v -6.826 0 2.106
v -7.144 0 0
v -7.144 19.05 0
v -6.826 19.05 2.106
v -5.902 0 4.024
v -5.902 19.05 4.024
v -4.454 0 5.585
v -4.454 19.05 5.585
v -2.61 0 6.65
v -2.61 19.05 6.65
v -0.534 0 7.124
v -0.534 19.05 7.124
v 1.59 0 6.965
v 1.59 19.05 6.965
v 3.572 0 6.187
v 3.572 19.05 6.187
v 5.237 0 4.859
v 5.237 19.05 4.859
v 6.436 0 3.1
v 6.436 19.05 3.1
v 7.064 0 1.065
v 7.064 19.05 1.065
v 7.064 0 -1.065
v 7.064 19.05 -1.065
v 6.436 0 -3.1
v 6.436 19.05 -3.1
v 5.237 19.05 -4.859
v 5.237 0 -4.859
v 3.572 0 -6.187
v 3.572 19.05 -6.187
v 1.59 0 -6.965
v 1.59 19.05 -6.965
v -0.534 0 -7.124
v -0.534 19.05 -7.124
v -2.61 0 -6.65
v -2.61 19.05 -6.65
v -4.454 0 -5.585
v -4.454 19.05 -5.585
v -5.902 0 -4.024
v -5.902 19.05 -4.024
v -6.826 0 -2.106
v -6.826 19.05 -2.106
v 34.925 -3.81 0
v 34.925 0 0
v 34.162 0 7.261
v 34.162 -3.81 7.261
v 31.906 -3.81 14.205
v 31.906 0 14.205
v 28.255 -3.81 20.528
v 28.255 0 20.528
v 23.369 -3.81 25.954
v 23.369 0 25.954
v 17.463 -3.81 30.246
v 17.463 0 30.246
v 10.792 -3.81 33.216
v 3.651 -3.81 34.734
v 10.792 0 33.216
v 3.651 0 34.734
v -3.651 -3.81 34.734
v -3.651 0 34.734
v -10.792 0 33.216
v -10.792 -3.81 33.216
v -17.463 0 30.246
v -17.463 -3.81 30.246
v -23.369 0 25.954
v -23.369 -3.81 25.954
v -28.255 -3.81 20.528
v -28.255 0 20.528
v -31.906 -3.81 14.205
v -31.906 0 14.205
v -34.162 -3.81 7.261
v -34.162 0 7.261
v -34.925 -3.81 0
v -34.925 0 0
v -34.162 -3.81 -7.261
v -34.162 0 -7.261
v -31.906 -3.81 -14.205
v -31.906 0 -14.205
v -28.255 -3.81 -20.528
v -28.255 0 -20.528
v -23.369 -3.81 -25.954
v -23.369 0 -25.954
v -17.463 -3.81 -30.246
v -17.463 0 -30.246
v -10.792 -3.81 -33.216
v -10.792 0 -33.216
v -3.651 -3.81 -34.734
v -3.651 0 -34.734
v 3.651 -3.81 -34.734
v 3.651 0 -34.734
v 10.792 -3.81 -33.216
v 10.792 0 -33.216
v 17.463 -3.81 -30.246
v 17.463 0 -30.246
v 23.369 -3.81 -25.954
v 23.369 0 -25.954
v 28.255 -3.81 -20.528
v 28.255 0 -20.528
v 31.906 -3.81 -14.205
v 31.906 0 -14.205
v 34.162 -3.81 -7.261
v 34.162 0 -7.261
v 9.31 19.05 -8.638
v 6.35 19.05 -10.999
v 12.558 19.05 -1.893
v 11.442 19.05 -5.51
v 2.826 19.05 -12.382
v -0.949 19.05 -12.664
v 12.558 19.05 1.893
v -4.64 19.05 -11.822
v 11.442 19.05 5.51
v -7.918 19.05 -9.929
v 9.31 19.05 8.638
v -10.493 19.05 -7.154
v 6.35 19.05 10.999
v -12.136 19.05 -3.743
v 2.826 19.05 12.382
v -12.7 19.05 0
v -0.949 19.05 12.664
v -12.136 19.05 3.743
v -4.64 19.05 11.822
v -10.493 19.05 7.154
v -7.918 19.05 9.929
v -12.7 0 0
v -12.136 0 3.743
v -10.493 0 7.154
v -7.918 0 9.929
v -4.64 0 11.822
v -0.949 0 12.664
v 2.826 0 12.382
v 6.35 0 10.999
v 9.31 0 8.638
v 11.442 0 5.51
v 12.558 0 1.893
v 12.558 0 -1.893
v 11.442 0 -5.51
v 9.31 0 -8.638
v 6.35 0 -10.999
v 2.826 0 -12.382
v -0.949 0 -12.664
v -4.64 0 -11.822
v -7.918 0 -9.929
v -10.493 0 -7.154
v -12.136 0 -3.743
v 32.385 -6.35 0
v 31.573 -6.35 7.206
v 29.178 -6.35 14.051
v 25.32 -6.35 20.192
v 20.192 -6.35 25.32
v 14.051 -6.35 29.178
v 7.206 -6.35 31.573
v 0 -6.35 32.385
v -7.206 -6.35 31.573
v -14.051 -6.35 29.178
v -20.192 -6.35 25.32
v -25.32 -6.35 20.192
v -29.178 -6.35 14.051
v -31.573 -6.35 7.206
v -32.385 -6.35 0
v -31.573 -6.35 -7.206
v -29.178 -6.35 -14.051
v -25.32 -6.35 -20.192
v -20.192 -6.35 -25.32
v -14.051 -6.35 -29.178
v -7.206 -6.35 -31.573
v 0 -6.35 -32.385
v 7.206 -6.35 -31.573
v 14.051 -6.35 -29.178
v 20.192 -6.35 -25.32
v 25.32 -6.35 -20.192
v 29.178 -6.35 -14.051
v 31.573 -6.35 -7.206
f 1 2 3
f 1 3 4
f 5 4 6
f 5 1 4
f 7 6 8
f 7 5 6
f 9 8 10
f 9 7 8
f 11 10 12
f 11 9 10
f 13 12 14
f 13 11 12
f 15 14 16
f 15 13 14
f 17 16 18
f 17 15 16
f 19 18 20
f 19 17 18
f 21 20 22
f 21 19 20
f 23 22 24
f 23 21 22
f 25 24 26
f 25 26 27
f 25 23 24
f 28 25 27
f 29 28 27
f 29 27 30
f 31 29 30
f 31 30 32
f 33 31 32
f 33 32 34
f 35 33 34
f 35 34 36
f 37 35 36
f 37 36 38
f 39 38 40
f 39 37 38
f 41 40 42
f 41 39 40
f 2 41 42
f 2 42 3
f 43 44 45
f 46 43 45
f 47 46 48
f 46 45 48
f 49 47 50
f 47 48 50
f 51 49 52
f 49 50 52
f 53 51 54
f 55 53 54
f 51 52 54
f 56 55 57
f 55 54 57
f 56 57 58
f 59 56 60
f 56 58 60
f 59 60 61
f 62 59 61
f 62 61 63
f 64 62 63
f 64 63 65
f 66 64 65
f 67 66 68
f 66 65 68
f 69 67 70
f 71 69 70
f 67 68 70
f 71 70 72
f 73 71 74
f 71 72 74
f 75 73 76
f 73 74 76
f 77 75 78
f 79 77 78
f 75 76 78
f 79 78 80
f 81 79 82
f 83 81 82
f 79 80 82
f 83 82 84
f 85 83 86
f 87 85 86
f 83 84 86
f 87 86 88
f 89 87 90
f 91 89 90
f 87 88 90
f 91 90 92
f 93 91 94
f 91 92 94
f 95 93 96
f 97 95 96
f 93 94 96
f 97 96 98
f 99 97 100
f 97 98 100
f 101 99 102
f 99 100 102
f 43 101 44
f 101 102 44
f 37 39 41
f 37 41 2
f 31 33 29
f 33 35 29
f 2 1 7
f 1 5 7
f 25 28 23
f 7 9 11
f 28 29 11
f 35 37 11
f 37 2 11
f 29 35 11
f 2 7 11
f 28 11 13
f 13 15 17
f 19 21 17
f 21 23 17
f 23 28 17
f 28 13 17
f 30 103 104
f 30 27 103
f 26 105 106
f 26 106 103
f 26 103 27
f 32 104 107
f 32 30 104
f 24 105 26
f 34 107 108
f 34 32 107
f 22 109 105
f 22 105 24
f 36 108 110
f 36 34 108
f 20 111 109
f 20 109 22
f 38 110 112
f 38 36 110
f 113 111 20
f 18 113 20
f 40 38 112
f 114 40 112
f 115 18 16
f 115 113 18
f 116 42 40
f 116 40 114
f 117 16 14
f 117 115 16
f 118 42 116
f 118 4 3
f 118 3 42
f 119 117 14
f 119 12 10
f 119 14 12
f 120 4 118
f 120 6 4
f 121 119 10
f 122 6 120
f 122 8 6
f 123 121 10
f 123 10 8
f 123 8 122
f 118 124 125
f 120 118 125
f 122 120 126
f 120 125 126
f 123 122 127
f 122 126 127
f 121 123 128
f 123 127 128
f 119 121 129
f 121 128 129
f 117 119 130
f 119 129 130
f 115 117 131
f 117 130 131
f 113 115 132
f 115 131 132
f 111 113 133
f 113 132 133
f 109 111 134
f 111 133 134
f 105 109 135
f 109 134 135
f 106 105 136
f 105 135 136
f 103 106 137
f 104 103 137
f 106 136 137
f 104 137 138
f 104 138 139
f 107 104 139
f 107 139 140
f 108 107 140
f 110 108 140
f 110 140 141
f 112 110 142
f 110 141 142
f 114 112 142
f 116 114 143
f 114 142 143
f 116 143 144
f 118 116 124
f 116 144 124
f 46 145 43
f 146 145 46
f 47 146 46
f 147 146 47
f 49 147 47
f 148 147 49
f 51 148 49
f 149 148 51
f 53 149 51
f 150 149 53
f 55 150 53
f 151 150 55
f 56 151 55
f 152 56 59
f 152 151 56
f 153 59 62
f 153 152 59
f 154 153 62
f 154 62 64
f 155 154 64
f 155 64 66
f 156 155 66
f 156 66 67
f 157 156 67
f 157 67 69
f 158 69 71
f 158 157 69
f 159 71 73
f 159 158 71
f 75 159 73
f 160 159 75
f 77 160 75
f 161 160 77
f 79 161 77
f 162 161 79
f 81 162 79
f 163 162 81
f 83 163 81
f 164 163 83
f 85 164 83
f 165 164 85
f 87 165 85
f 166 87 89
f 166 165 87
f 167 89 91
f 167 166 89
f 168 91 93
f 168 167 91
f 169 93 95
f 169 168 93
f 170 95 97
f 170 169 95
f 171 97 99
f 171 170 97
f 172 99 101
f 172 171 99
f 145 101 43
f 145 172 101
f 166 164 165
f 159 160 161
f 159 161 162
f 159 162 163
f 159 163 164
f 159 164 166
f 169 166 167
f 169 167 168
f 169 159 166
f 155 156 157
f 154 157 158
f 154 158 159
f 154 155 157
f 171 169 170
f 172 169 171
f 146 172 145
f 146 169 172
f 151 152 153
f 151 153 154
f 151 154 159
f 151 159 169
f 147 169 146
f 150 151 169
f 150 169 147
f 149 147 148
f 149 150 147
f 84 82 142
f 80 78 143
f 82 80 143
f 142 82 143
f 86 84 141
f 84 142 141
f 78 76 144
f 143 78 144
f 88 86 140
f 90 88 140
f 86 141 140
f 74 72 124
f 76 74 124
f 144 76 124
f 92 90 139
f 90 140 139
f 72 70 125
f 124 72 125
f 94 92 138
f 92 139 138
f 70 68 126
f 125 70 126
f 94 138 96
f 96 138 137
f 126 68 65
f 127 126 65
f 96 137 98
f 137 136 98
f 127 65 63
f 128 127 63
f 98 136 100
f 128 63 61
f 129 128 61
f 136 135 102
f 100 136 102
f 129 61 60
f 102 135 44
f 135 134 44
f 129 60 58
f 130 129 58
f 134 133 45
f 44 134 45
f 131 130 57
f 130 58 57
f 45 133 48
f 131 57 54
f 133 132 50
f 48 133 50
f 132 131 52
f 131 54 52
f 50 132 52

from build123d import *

# Parameters (mm, degrees)
F0_R     = 34.925
F1_DEPTH = 6.35
F2_SIZE  = 2.54
F3_R     = 12.7
F3_R_2   = 7.14375
F4_DEPTH = 19.05


with BuildPart() as f1:
    # F0 (on Front) → F1 (new body)
    with BuildSketch(Plane.XZ):
        Circle(F0_R)
    extrude(amount=F1_DEPTH)

    # F2
    f2_edges = [f1.edges().sort_by_distance(p)[0] for p in [
        (-34.925, -6.35, 0),
    ]]
    chamfer(f2_edges, length=F2_SIZE)

    # F3 (on face) → F4 (join)
    with BuildSketch(Plane(origin=(0, 0, 0), x_dir=(-1, 0, 0), z_dir=(0, 1, 0))):
        Circle(F3_R)
        Circle(F3_R_2, mode=Mode.SUBTRACT)
    extrude(amount=F4_DEPTH)


solid = f1.part
